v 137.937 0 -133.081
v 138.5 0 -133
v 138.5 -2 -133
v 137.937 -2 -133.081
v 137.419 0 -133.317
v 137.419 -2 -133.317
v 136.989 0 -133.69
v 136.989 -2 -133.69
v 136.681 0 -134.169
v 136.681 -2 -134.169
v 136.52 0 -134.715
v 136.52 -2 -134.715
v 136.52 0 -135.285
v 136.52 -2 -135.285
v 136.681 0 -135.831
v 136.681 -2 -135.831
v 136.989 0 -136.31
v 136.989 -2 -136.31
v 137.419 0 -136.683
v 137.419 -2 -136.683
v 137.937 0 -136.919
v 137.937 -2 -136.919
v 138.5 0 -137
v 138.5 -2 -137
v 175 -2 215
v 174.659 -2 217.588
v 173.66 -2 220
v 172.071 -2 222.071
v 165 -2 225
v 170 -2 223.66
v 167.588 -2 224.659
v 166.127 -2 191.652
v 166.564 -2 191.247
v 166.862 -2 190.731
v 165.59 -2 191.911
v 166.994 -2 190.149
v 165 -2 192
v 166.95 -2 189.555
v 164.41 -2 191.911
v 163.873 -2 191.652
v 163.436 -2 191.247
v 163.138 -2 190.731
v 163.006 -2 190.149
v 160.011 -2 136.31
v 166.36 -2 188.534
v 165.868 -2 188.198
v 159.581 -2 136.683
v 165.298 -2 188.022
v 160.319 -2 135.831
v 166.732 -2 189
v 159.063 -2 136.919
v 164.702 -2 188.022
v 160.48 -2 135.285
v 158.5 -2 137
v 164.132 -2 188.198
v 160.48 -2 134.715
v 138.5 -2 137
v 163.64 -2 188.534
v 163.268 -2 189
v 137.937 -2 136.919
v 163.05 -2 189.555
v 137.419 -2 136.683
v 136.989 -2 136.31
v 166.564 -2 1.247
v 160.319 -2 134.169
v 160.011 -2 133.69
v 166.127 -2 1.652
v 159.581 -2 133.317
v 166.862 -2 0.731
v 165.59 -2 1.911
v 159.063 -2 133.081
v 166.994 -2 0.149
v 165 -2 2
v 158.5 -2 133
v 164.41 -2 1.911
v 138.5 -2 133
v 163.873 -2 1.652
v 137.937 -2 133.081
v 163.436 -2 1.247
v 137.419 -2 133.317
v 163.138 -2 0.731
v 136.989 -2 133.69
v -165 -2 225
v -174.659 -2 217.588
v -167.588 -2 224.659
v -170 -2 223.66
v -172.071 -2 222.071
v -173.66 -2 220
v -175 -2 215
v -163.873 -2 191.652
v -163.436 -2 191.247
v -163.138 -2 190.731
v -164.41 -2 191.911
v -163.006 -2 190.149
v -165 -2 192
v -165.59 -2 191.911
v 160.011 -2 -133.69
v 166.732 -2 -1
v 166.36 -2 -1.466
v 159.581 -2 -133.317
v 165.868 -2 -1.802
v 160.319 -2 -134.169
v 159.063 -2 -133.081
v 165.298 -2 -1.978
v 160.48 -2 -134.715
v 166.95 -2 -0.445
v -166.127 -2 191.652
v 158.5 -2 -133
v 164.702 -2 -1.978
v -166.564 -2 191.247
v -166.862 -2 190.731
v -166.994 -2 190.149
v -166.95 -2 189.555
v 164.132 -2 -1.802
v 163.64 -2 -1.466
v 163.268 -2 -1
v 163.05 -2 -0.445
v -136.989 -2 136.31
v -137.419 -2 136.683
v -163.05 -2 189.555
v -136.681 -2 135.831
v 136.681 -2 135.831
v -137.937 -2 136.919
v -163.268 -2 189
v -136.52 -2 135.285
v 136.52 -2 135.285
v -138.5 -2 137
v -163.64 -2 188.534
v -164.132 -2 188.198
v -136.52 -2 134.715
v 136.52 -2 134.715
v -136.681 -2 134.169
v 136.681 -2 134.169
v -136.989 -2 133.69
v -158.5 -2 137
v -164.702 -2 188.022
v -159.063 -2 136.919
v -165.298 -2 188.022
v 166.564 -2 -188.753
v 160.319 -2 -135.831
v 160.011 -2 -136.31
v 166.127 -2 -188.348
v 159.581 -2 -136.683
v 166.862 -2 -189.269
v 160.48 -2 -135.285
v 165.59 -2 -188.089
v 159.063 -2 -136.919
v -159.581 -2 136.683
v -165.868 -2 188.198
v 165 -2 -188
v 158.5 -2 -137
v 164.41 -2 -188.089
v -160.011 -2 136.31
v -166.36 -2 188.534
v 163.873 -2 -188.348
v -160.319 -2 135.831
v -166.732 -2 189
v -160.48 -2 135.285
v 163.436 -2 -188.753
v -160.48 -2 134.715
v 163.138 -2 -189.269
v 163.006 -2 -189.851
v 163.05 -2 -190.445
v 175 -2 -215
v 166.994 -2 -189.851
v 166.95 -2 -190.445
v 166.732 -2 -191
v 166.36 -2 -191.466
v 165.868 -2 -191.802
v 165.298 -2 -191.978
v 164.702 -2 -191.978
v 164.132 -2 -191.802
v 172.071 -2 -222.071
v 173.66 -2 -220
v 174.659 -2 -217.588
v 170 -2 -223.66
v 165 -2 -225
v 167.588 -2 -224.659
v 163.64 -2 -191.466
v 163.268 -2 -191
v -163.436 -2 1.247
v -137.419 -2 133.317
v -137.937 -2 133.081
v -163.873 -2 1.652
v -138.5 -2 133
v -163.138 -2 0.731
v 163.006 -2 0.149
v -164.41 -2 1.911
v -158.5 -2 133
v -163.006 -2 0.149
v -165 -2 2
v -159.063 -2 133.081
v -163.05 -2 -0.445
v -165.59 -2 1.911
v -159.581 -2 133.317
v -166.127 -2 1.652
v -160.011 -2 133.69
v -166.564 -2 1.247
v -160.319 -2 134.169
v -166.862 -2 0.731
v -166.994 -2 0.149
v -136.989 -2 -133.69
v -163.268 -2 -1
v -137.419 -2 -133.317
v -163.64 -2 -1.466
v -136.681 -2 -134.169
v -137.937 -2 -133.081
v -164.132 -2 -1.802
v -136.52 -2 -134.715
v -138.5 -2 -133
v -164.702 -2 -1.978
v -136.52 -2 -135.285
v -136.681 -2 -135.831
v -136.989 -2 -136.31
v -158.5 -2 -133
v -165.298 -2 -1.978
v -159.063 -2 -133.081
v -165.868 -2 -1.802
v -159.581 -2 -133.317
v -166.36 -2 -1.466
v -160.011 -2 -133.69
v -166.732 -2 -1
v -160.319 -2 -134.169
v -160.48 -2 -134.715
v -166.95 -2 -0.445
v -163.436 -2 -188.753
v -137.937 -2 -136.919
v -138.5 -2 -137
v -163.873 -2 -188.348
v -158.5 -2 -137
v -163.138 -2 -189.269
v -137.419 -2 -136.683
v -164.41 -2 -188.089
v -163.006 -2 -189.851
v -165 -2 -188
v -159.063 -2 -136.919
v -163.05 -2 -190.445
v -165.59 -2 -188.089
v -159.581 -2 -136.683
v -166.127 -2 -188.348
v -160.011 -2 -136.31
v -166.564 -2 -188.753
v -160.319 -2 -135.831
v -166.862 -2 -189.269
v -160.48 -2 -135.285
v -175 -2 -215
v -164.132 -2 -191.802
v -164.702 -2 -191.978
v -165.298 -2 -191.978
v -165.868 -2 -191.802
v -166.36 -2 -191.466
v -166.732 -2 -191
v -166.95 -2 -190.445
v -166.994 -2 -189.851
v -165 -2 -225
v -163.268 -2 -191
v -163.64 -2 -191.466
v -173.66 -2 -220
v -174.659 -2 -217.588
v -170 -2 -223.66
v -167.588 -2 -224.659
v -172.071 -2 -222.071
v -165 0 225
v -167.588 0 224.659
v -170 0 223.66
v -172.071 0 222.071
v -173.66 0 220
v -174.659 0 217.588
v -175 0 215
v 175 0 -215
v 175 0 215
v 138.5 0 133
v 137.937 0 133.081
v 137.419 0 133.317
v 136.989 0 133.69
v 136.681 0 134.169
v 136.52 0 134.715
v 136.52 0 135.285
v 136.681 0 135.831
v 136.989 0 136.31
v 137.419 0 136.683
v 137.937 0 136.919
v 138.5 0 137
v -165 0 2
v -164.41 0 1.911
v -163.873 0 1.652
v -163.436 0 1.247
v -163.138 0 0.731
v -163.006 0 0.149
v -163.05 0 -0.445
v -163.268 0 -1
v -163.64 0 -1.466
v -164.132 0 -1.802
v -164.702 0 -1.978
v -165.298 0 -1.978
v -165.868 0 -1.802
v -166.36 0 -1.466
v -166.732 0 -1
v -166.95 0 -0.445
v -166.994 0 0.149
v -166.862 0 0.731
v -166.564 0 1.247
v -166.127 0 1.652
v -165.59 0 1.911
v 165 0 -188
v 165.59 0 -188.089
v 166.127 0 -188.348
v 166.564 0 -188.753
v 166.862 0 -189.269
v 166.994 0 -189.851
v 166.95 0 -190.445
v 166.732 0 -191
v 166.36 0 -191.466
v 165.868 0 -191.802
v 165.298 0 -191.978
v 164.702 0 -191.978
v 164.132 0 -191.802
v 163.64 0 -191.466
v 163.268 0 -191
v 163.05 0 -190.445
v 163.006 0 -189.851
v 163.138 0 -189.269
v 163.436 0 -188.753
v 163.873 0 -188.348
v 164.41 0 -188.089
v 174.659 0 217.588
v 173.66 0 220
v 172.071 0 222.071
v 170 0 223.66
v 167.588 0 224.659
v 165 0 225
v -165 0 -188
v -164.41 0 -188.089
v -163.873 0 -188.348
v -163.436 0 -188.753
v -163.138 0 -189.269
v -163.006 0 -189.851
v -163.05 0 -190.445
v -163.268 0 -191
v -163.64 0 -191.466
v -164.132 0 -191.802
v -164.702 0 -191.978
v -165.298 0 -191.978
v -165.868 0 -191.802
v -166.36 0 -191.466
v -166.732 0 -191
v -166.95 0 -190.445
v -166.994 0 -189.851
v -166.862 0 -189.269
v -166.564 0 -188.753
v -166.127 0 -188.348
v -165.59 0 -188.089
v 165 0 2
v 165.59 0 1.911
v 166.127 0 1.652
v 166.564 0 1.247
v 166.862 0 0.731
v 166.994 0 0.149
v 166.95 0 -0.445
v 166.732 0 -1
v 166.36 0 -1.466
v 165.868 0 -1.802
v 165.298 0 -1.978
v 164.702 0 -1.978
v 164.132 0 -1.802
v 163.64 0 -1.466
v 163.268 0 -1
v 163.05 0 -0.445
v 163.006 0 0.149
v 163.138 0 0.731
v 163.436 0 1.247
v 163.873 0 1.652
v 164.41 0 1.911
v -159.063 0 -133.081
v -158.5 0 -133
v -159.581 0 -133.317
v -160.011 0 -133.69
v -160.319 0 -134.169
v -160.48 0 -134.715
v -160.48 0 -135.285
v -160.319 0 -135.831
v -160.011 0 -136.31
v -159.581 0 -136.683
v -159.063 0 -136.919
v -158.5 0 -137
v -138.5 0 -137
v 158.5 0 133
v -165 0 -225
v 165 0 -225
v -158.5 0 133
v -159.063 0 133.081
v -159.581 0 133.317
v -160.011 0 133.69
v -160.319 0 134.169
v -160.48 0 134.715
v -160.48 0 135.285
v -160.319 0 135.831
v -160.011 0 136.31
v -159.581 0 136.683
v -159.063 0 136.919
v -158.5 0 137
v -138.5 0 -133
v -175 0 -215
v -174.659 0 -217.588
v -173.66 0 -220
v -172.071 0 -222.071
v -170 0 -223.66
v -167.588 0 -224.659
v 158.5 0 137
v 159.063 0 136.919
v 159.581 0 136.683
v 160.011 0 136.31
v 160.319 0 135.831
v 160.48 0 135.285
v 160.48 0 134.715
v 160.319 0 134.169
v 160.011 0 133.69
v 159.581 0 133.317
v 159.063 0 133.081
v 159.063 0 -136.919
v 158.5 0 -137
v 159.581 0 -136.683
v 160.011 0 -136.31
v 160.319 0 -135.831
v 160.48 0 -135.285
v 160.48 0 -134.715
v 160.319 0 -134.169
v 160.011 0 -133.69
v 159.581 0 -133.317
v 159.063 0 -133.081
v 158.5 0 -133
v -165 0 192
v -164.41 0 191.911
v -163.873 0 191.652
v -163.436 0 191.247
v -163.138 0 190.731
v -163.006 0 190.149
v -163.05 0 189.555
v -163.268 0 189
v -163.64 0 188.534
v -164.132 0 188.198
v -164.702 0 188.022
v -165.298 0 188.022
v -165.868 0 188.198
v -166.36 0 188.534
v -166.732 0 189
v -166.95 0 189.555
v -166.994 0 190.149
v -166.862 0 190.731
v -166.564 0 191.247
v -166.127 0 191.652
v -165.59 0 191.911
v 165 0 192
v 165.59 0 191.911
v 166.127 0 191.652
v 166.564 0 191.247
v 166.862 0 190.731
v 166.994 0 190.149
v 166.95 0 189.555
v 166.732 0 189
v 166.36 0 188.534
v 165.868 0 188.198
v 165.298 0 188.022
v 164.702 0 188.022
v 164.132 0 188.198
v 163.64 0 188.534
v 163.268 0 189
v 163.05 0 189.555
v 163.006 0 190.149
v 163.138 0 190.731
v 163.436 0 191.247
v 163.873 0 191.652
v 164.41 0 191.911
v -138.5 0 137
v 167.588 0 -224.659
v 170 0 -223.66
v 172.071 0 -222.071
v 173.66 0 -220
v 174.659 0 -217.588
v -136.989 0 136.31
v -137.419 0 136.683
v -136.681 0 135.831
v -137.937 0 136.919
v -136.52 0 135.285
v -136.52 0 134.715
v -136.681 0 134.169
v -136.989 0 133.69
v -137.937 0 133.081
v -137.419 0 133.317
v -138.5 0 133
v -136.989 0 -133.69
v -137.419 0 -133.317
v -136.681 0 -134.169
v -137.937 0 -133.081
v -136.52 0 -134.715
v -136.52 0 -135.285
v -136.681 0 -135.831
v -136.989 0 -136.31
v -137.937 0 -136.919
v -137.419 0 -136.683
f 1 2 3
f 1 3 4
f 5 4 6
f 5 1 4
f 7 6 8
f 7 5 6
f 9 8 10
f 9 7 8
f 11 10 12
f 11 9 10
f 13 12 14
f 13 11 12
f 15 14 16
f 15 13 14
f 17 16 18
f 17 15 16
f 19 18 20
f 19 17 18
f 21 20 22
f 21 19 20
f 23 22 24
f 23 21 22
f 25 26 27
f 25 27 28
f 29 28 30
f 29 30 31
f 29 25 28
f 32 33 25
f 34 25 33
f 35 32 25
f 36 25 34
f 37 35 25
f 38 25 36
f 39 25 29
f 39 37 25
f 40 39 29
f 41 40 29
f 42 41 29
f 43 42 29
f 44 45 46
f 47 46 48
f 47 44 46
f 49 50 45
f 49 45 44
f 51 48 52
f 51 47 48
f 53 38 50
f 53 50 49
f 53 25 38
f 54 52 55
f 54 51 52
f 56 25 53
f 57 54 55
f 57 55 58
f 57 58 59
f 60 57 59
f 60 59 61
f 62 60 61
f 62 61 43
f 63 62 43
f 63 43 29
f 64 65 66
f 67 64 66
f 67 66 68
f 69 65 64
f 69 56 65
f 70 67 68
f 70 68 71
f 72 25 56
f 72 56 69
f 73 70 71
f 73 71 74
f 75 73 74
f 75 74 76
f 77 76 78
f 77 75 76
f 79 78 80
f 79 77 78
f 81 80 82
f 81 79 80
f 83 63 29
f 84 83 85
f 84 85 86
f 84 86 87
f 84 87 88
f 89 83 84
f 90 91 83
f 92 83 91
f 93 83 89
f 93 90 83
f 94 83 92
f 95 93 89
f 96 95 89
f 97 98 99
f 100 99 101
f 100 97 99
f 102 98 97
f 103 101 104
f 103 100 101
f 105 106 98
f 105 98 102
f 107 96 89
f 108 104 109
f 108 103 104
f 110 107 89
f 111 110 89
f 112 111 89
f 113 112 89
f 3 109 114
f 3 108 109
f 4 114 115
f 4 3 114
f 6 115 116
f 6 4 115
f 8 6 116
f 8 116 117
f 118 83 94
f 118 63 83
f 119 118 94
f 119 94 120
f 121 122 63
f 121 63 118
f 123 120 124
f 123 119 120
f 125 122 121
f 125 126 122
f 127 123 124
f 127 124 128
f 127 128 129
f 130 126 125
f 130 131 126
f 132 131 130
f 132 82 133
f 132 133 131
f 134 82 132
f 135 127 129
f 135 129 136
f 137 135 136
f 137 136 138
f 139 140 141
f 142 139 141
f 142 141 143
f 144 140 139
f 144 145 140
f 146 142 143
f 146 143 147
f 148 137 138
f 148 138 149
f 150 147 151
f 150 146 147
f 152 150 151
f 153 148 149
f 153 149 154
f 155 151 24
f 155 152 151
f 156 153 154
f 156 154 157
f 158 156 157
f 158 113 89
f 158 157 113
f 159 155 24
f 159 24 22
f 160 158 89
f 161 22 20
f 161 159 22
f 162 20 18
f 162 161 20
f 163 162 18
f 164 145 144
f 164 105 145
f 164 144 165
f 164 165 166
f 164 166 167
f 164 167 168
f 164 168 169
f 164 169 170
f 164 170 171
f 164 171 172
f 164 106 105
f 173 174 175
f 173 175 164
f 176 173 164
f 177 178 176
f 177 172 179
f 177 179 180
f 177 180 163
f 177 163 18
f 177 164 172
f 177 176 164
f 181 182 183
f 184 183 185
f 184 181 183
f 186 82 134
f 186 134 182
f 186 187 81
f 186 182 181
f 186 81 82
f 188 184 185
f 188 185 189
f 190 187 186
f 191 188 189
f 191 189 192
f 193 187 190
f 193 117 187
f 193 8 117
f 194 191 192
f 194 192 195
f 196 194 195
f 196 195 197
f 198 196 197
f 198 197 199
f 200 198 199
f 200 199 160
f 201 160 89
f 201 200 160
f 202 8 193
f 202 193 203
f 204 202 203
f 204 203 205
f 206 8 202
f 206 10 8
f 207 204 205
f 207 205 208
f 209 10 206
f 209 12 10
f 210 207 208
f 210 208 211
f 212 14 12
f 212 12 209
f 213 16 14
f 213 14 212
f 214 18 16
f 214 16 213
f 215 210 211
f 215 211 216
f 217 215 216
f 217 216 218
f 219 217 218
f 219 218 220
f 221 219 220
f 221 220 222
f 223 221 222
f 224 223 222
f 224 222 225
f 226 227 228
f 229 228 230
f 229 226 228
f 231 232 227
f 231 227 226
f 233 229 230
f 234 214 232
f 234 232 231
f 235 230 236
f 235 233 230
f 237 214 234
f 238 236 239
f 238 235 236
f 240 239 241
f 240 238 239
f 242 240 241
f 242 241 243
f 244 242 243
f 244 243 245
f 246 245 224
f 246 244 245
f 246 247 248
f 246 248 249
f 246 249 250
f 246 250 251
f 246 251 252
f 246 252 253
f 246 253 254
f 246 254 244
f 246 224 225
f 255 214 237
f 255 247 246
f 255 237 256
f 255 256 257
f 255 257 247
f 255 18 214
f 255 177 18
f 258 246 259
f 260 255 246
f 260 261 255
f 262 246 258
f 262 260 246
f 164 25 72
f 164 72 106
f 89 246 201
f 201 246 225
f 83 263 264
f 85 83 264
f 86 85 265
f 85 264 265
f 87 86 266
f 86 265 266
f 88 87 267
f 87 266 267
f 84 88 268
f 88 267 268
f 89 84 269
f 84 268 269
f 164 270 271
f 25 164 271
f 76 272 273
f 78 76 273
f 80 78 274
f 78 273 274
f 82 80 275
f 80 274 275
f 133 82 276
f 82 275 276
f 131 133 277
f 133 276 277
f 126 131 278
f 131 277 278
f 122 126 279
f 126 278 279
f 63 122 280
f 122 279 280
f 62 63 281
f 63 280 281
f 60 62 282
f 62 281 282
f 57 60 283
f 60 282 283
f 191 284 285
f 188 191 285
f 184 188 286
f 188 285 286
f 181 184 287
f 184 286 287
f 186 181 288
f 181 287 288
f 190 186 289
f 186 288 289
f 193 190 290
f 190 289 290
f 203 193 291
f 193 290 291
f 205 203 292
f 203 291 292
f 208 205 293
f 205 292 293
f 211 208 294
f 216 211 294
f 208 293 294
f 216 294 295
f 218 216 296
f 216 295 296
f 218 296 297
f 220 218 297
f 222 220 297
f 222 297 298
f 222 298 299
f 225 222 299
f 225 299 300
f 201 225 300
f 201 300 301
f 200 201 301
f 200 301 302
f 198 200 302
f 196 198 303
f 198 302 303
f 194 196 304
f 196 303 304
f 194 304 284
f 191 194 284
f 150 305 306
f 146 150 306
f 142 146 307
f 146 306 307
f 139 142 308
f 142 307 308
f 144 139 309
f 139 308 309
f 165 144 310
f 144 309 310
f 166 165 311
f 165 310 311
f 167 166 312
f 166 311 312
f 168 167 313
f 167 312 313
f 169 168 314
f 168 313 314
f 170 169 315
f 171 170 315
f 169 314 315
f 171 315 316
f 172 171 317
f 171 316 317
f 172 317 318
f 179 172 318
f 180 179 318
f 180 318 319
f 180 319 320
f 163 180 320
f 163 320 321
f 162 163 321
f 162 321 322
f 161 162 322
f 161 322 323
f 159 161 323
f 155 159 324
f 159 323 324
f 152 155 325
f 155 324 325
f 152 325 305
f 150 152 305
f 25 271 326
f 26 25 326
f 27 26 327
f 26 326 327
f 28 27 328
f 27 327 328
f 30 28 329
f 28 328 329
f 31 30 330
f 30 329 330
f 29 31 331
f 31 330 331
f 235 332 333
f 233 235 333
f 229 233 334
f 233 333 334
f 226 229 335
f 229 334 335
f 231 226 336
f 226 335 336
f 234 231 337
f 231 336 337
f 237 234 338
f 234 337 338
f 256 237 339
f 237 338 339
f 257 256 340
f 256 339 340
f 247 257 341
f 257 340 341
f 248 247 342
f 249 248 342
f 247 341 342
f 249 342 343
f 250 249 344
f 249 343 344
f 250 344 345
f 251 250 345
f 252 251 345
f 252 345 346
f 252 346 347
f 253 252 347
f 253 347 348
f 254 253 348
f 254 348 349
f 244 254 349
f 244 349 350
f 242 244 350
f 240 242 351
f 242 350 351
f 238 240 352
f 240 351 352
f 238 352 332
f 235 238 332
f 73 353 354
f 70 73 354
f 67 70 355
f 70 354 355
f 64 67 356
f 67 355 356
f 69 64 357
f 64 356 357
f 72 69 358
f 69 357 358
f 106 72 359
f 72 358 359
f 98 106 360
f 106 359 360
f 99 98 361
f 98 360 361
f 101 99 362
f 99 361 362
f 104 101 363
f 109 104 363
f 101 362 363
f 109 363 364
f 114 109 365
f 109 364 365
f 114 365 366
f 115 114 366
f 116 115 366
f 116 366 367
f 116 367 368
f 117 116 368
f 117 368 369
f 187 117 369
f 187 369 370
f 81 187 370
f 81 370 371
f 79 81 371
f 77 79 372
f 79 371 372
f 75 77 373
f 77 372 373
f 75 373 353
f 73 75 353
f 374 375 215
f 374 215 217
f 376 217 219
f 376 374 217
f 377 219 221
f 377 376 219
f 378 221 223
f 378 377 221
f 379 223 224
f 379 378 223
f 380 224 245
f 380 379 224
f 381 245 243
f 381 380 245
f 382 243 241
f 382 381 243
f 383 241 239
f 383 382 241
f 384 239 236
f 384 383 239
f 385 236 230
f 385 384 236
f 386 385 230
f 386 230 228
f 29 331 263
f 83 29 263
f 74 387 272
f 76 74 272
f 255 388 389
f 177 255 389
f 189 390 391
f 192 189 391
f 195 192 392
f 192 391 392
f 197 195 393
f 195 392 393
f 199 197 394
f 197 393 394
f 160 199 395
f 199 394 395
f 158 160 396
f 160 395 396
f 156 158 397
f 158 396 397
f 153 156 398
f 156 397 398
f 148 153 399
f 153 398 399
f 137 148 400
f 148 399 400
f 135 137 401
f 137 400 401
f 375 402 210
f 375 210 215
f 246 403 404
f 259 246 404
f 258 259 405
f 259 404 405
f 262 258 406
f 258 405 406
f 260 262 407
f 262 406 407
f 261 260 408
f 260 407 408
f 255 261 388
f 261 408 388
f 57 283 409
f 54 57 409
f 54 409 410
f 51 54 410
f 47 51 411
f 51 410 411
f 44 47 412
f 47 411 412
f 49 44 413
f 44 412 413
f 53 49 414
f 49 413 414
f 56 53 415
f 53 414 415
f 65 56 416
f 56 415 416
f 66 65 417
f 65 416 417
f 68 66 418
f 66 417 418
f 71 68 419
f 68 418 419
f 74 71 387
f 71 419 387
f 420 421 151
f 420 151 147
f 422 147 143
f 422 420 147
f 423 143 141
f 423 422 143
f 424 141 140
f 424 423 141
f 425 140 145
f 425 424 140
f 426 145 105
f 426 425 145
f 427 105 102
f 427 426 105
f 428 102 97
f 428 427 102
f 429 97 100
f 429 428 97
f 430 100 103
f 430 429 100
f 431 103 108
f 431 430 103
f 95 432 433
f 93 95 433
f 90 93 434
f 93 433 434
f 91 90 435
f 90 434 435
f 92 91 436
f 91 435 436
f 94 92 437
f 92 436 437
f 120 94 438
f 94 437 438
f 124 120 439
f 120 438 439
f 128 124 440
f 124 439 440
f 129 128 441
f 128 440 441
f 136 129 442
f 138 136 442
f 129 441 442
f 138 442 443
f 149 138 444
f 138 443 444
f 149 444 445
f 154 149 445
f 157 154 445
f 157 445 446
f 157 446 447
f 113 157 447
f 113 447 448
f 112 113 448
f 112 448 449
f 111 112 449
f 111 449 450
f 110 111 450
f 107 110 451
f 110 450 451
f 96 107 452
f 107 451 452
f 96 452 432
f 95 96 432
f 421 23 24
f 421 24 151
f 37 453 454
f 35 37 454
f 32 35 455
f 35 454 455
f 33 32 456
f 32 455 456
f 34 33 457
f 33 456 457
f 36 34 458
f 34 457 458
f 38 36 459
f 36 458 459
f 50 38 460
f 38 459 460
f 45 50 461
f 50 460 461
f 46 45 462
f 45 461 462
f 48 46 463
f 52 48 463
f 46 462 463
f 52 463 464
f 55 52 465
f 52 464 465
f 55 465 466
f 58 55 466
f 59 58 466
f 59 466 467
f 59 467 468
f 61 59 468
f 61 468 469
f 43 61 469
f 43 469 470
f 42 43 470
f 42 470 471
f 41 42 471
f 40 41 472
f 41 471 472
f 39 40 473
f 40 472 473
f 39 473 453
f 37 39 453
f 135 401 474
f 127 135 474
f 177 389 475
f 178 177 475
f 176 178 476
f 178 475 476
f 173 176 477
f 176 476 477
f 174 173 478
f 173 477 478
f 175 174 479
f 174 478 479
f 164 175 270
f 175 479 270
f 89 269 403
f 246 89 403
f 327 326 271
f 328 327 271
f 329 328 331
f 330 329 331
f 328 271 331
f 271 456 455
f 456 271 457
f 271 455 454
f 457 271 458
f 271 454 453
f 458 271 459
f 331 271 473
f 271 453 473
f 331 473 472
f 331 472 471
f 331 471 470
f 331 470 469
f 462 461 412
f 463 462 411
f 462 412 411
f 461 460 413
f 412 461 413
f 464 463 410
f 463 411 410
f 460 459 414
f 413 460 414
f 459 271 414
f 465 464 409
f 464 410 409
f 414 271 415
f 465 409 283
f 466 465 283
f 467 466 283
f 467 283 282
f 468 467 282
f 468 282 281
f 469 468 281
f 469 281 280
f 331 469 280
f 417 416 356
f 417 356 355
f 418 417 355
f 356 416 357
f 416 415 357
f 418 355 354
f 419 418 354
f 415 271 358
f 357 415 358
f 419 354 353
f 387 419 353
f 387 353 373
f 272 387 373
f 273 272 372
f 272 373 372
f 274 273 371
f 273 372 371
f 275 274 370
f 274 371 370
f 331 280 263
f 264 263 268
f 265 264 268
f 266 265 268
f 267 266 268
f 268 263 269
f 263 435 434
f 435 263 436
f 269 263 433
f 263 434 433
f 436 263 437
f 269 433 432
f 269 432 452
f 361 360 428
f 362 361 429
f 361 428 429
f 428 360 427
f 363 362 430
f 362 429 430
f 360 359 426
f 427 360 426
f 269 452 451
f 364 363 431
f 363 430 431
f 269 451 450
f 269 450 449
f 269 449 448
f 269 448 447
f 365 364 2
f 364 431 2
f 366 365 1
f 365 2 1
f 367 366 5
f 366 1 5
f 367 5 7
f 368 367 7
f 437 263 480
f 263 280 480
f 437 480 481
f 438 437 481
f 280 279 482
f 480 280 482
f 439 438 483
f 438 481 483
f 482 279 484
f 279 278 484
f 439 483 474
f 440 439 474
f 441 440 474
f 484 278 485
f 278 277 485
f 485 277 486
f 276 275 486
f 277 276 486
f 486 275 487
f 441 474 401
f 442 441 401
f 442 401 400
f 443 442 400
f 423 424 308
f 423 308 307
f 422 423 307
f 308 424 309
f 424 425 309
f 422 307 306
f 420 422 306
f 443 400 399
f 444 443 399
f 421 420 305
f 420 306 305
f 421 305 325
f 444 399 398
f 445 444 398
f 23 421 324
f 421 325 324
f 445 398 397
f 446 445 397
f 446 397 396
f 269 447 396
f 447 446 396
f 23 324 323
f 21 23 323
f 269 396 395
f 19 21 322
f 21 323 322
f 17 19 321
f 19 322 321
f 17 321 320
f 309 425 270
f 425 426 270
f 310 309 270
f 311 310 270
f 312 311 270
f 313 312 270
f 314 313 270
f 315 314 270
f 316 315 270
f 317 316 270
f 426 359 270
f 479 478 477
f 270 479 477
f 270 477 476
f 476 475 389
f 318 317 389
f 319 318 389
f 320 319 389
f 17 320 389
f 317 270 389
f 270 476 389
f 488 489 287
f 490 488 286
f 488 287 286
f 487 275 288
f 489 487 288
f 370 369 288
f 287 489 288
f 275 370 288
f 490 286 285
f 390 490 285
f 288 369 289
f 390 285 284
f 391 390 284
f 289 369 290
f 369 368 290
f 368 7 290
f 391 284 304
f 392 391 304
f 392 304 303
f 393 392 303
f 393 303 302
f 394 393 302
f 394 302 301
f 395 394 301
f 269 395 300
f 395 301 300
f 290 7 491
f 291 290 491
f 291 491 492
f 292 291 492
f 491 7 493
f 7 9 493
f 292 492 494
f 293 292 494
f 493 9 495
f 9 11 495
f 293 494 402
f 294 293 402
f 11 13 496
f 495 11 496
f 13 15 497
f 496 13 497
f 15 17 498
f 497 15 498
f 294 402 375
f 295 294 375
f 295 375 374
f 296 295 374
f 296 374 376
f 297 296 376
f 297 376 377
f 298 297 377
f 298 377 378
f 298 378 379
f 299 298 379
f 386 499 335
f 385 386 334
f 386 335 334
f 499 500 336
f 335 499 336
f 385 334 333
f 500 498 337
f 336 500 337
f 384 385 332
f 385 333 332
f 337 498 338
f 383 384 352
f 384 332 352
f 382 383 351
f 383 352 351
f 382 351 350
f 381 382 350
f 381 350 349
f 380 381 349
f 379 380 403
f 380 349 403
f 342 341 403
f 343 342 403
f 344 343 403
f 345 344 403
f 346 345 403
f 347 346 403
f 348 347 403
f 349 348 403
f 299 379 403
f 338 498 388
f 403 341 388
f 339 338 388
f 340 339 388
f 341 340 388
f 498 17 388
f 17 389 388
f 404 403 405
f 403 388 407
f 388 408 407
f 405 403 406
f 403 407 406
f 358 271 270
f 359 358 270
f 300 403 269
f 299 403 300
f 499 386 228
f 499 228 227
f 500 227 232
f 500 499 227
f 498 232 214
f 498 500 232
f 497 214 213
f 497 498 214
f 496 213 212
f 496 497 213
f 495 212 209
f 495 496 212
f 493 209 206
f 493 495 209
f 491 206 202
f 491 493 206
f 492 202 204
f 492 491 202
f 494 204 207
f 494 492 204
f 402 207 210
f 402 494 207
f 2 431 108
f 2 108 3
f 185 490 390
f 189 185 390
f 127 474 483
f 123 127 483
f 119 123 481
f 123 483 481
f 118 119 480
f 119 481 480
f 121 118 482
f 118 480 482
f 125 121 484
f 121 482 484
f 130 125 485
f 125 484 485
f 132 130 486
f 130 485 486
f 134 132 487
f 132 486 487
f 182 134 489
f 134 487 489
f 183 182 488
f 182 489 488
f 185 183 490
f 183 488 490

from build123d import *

# Parameters (mm, degrees)
SKETCH_1_R             = 2
SM_BASE_FLANGE_1_DEPTH = 2


# Sheet-metal steps are written as plain solids
with BuildPart() as part:
    # Sketch 1 → 基体-法兰1 (new body)
    with BuildSketch(Plane(origin=(0, 0, 0), x_dir=(1, 0, 0), z_dir=(0, 1, 0))):
        with BuildLine():
            Line((-165, 225), (165, 225))
            ThreePointArc((165, 225), (172.071067812, 222.071067812), (175, 215))
            Line((175, 215), (175, -215))
            ThreePointArc((175, -215), (172.071067812, -222.071067812), (165, -225))
            Line((165, -225), (-165, -225))
            ThreePointArc((-165, -225), (-172.071067812, -222.071067812), (-175, -215))
            Line((-175, -215), (-175, 215))
            ThreePointArc((-175, 215), (-172.071067812, 222.071067812), (-165, 225))
        make_face()
        with Locations(Location((-165, 190, 0), (0, 0, 270))):
            Circle(SKETCH_1_R, mode=Mode.SUBTRACT)
        with Locations(Location((165, 190, 0), (0, 0, 270))):
            Circle(SKETCH_1_R, mode=Mode.SUBTRACT)
        with Locations(Location((165, 0, 0), (0, 0, 270))):
            Circle(SKETCH_1_R, mode=Mode.SUBTRACT)
        with Locations(Location((165, -190, 0), (0, 0, 270))):
            Circle(SKETCH_1_R, mode=Mode.SUBTRACT)
        with Locations(Location((-165, -190, 0), (0, 0, 270))):
            Circle(SKETCH_1_R, mode=Mode.SUBTRACT)
        with Locations(Location((-165, 0, 0), (0, 0, 270))):
            Circle(SKETCH_1_R, mode=Mode.SUBTRACT)
        with BuildLine():
            Line((-158.5, 137), (-138.5, 137))
            ThreePointArc((-138.5, 137), (-136.5, 135), (-138.5, 133))
            Line((-138.5, 133), (-158.5, 133))
            ThreePointArc((-158.5, 133), (-160.5, 135), (-158.5, 137))
        make_face(mode=Mode.SUBTRACT)
        with BuildLine():
            Line((138.5, 137), (158.5, 137))
            ThreePointArc((158.5, 137), (160.5, 135), (158.5, 133))
            Line((158.5, 133), (138.5, 133))
            ThreePointArc((138.5, 133), (136.5, 135), (138.5, 137))
        make_face(mode=Mode.SUBTRACT)
        with BuildLine():
            Line((-158.5, -137), (-138.5, -137))
            ThreePointArc((-138.5, -137), (-136.5, -135), (-138.5, -133))
            Line((-138.5, -133), (-158.5, -133))
            ThreePointArc((-158.5, -133), (-160.5, -135), (-158.5, -137))
        make_face(mode=Mode.SUBTRACT)
        with BuildLine():
            Line((138.5, -137), (158.5, -137))
            ThreePointArc((158.5, -137), (160.5, -135), (158.5, -133))
            Line((158.5, -133), (138.5, -133))
            ThreePointArc((138.5, -133), (136.5, -135), (138.5, -137))
        make_face(mode=Mode.SUBTRACT)
    extrude(amount=-SM_BASE_FLANGE_1_DEPTH)


solid = part.part
